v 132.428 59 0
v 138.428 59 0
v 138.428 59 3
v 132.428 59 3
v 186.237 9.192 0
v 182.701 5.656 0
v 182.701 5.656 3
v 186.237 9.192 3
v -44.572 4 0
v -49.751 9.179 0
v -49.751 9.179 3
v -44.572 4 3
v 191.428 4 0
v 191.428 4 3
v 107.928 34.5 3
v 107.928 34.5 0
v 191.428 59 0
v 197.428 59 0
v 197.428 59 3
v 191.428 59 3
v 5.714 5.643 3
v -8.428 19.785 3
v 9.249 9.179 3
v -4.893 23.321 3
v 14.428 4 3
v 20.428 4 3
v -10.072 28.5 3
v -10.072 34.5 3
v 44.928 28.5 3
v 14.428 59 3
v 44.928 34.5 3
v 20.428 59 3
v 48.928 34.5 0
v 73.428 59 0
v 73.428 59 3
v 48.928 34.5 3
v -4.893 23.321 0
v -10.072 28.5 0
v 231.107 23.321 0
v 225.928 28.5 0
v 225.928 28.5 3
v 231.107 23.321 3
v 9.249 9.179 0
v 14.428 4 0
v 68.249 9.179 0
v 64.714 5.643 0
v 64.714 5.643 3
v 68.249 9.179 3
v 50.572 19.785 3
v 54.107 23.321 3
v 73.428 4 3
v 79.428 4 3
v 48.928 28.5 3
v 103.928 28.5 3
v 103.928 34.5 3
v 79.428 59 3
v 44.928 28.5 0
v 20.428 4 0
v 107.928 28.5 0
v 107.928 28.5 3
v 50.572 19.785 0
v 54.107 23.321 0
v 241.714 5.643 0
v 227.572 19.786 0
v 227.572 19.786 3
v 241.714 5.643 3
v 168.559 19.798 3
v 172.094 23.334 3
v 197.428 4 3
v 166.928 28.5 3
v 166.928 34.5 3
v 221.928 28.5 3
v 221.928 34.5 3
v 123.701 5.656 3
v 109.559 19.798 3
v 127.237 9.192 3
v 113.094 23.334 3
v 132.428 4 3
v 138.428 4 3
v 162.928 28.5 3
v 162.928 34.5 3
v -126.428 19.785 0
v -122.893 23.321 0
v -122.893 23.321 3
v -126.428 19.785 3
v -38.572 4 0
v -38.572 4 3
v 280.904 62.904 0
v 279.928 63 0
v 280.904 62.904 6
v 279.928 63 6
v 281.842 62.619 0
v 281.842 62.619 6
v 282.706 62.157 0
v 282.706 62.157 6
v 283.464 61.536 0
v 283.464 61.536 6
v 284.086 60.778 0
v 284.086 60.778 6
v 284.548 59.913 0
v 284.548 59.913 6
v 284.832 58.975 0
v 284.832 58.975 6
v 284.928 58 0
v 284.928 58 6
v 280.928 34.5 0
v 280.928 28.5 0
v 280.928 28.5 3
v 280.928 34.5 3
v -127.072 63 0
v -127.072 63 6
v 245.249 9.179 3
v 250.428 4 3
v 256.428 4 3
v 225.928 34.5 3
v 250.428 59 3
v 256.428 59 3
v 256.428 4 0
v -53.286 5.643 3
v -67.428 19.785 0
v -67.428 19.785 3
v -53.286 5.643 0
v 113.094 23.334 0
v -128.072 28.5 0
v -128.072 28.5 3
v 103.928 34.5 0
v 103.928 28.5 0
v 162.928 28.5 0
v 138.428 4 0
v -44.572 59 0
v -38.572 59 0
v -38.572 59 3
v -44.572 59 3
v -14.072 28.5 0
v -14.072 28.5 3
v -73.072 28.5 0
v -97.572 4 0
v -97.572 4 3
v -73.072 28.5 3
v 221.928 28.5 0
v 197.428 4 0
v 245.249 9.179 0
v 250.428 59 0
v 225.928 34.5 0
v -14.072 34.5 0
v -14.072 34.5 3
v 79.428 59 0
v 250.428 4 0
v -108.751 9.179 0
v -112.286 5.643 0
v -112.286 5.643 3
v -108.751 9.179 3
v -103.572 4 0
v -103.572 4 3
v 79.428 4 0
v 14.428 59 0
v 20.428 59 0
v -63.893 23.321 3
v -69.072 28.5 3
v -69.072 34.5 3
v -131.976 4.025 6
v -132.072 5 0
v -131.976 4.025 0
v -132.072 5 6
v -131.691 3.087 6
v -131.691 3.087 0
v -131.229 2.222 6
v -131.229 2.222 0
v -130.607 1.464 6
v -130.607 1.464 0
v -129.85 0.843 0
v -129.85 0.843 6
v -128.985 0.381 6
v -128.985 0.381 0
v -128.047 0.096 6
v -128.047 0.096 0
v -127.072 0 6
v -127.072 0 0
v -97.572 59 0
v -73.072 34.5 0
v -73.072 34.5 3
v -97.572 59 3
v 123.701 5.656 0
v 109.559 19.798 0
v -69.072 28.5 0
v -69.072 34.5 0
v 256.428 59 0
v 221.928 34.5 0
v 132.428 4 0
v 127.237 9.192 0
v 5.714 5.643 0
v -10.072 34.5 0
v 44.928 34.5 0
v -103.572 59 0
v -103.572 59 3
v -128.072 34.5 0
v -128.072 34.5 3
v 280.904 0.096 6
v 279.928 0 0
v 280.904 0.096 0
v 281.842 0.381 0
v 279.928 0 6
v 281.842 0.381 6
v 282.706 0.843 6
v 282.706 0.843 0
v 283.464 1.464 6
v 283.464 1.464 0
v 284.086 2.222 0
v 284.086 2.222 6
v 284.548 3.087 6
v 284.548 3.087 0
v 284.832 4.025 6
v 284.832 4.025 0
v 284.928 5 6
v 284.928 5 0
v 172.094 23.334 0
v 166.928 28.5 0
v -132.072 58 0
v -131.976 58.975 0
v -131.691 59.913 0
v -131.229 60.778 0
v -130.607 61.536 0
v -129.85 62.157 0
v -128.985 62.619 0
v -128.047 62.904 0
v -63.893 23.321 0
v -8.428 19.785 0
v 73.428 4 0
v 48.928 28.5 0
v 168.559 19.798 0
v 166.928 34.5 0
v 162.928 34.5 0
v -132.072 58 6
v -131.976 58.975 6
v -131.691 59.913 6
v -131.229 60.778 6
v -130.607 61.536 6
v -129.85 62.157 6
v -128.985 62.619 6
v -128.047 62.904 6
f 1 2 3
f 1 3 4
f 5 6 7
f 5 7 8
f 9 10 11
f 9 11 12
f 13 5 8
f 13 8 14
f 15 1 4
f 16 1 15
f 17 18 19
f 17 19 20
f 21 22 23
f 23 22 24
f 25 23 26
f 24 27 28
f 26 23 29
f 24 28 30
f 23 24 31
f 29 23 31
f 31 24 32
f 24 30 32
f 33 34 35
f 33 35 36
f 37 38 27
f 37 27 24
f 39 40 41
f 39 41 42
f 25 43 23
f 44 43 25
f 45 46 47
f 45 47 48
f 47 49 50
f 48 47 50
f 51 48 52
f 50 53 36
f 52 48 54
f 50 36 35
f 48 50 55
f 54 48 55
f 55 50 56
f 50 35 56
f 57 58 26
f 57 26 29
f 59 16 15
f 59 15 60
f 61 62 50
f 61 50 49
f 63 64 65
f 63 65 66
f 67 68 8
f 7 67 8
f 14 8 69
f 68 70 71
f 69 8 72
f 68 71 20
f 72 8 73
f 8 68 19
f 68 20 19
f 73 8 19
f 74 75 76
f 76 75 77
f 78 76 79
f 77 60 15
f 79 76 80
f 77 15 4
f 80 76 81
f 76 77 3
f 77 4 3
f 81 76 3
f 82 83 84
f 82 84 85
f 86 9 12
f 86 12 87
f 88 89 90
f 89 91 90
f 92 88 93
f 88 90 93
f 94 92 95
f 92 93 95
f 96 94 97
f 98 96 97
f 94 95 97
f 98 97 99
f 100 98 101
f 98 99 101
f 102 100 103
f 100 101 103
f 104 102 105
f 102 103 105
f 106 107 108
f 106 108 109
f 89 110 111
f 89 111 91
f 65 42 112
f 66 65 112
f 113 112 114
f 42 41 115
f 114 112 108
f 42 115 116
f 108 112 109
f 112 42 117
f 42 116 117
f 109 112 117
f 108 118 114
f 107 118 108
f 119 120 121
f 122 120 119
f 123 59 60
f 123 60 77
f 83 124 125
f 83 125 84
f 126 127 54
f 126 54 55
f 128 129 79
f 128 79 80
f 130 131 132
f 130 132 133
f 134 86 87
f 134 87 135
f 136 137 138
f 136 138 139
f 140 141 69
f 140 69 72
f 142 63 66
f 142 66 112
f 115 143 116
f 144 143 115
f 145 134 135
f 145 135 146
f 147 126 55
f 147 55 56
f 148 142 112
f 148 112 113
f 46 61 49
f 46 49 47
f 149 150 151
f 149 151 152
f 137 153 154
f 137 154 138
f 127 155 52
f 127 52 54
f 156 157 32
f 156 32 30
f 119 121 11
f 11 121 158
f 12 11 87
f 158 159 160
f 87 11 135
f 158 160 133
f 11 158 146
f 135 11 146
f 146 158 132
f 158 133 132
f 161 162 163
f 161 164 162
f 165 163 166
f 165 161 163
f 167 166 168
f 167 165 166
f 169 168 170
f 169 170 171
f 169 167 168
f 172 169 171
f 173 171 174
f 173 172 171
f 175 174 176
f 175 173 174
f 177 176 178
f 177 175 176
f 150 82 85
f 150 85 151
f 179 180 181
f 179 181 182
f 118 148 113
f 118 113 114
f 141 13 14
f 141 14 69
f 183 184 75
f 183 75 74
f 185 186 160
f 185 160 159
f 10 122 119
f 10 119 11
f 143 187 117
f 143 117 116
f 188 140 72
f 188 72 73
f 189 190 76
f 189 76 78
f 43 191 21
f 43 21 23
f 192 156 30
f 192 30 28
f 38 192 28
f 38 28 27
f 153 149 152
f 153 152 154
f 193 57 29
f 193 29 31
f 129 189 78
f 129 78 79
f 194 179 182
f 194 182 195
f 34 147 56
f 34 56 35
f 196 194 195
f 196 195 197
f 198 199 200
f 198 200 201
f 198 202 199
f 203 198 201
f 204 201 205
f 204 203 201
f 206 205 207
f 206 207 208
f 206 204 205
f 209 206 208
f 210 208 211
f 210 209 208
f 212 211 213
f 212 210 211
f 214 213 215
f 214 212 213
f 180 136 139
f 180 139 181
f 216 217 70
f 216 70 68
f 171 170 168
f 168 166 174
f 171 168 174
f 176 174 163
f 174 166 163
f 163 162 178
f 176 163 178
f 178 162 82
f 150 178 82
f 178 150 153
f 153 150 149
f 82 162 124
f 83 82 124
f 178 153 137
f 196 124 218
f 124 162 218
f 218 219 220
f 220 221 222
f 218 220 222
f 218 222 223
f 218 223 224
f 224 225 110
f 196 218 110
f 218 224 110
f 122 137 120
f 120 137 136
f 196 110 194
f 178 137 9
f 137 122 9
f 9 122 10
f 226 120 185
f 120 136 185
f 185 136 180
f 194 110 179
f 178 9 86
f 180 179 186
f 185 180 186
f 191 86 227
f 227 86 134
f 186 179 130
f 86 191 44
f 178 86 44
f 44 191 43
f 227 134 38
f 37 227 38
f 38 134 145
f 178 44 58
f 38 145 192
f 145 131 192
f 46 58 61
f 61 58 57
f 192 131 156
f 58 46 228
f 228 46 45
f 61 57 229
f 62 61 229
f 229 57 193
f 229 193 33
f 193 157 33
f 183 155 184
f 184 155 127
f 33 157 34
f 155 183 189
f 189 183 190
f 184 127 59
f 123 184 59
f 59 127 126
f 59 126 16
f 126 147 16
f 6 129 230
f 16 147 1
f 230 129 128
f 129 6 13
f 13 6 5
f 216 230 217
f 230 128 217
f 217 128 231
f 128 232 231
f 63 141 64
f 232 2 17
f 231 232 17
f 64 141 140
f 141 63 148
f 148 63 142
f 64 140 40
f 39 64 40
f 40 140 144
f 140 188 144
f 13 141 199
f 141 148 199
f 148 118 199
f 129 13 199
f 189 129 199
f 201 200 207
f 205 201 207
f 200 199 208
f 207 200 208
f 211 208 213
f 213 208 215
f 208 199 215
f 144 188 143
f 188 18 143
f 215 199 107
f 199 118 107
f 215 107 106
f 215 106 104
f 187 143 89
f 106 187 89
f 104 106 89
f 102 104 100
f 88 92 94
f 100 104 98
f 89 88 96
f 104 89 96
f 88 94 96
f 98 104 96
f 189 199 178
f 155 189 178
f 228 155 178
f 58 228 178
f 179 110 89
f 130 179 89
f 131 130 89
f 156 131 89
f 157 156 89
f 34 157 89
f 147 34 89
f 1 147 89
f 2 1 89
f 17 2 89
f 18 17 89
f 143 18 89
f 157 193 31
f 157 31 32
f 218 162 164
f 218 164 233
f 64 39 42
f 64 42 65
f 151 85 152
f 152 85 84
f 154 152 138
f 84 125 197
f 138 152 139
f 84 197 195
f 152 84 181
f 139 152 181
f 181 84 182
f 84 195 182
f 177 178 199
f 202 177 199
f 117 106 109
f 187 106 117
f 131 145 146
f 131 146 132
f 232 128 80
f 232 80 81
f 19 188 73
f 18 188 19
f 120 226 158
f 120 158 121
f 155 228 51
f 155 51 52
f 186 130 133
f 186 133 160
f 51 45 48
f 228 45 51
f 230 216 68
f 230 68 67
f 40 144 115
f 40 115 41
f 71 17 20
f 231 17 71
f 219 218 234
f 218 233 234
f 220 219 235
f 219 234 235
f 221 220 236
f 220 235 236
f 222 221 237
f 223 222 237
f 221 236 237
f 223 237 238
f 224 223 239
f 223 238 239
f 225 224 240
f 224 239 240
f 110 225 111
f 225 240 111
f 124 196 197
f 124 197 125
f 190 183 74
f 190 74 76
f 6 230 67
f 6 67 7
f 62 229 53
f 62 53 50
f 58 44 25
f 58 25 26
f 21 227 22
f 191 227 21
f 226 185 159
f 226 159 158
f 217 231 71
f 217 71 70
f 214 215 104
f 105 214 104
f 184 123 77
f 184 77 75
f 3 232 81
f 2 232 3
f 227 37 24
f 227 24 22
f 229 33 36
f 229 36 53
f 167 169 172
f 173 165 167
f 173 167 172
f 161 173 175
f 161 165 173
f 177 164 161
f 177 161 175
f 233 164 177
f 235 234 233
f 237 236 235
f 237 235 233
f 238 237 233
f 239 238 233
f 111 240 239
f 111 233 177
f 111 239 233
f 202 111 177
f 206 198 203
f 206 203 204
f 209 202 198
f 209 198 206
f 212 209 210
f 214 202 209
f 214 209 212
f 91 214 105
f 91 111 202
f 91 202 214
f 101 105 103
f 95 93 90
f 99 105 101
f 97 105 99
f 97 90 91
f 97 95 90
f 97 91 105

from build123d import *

# Parameters (mm, degrees)
F0_W      = 417
F0_H      = 63
F15_DEPTH = 6
F16_DEPTH = 3
F17_R     = 5


with BuildPart() as f15:
    # F0 (on Top) → F15 (new body)
    with BuildSketch(Plane.XY):
        with Locations((76.4282132271, 31.5)):
            Rectangle(F0_W, F0_H)
    extrude(amount=F15_DEPTH)

    # F1 (on Top) + F2 (on Top) + F3 (on Top) + F4 (on Top) + F5 (on Top) + F6 (on Top) + F7 (on Top) + F8 (on face) + F9 (on face) + F10 (on face) + F11 (on face) + F12 (on face) + F13 (on face) + F14 (on face) → F16 (cut)
    with BuildSketch(Plane.XY):
        Polygon((250.4282132271, 59), (225.9282132271, 34.5), (225.9282132271, 28.5), (250.4282132271, 4), (256.4282132271, 4), (280.9282132271, 28.5), (280.9282132271, 34.5), (256.4282132271, 59), align=None)
    with BuildSketch(Plane.XY):
        Polygon((191.4282132271, 59), (166.9282132271, 34.5), (166.9282132271, 28.5), (191.4282132271, 4), (197.4282132271, 4), (221.9282132271, 28.5), (221.9282132271, 34.5), (197.4282132271, 59), align=None)
    with BuildSketch(Plane.XY):
        Polygon((132.4282132271, 59), (107.9282132271, 34.5), (107.9282132271, 28.5), (132.4282132271, 4), (138.4282132271, 4), (162.9282132271, 28.5), (162.9282132271, 34.5), (138.4282132271, 59), align=None)
    with BuildSketch(Plane.XY):
        Polygon((73.4282150233, 59), (48.9282132271, 34.5000017962), (48.9282132271, 28.5000017962), (73.4282114309, 4), (79.4282114309, 4), (103.9282132271, 28.4999982038), (103.9282132271, 34.4999982038), (79.4282150233, 59), align=None)
    with BuildSketch(Plane.XY):
        Polygon((14.4282143313, 59), (-10.0717867729, 34.5000011042), (-10.0717867729, 28.5000011042), (14.4282121229, 4), (20.4282121229, 4), (44.9282132271, 28.4999988958), (44.9282132271, 34.4999988958), (20.4282143313, 59), align=None)
    with BuildSketch(Plane.XY):
        Polygon((-44.5717858043, 59), (-69.0717867729, 34.5000009686), (-69.0717867729, 28.5000009686), (-44.5717877415, 4), (-38.5717877415, 4), (-14.0717867729, 28.4999990314), (-14.0717867729, 34.4999990314), (-38.5717858043, 59), align=None)
    with BuildSketch(Plane.XY):
        Polygon((-103.5717843258, 59), (-128.0717867729, 34.5000024471), (-128.0717867729, 28.5000024471), (-103.57178922, 4), (-97.57178922, 4), (-73.0717867729, 28.4999975529), (-73.0717867729, 34.4999975529), (-97.5717843258, 59), align=None)
    with BuildSketch(Plane.XY):
        Polygon((245.2491989162, 9.1790143109), (231.1070632925, 23.3211499346), (227.5715293866, 19.7856160287), (241.7136650103, 5.6434804049), align=None)
    with BuildSketch(Plane.XY):
        Polygon((186.2366352396, 9.1915779875), (172.0944996159, 23.3337136112), (168.55896571, 19.7981797053), (182.7011013337, 5.6560440815), align=None)
    with BuildSketch(Plane.XY):
        Polygon((127.2366352396, 9.1915779875), (113.0944996159, 23.3337136112), (109.55896571, 19.7981797053), (123.7011013337, 5.6560440815), align=None)
    with BuildSketch(Plane.XY):
        Polygon((68.2493617452, 9.1788504451), (54.1072271583, 23.3209871057), (50.5716929931, 19.7854534589), (64.71382758, 5.6433167984), align=None)
    with BuildSketch(Plane.XY):
        Polygon((9.2493622909, 9.1788502988), (-4.8927726955, 23.3209865599), (-8.4283067607, 19.7854528133), (5.7138282256, 5.6433165522), align=None)
    with BuildSketch(Plane.XY):
        Polygon((-49.7506376022, 9.1788502702), (-63.8927726668, 23.320986453), (-67.4283067125, 19.7854526868), (-53.2861716479, 5.643316504), align=None)
    with BuildSketch(Plane.XY):
        Polygon((-108.7506387682, 9.1788505827), (-122.8927729793, 23.320987619), (-126.4283072384, 19.7854540662), (-112.2861730272, 5.6433170299), align=None)
    extrude(amount=F16_DEPTH, mode=Mode.SUBTRACT)

    # F17
    f17_edges = [f15.edges().sort_by_distance(p)[0] for p in [
        (284.928213, 0, 3),
        (284.928213, 63, 3),
        (-132.071787, 63, 3),
        (-132.071787, 0, 3),
    ]]
    fillet(f17_edges, radius=F17_R)


solid = f15.part
